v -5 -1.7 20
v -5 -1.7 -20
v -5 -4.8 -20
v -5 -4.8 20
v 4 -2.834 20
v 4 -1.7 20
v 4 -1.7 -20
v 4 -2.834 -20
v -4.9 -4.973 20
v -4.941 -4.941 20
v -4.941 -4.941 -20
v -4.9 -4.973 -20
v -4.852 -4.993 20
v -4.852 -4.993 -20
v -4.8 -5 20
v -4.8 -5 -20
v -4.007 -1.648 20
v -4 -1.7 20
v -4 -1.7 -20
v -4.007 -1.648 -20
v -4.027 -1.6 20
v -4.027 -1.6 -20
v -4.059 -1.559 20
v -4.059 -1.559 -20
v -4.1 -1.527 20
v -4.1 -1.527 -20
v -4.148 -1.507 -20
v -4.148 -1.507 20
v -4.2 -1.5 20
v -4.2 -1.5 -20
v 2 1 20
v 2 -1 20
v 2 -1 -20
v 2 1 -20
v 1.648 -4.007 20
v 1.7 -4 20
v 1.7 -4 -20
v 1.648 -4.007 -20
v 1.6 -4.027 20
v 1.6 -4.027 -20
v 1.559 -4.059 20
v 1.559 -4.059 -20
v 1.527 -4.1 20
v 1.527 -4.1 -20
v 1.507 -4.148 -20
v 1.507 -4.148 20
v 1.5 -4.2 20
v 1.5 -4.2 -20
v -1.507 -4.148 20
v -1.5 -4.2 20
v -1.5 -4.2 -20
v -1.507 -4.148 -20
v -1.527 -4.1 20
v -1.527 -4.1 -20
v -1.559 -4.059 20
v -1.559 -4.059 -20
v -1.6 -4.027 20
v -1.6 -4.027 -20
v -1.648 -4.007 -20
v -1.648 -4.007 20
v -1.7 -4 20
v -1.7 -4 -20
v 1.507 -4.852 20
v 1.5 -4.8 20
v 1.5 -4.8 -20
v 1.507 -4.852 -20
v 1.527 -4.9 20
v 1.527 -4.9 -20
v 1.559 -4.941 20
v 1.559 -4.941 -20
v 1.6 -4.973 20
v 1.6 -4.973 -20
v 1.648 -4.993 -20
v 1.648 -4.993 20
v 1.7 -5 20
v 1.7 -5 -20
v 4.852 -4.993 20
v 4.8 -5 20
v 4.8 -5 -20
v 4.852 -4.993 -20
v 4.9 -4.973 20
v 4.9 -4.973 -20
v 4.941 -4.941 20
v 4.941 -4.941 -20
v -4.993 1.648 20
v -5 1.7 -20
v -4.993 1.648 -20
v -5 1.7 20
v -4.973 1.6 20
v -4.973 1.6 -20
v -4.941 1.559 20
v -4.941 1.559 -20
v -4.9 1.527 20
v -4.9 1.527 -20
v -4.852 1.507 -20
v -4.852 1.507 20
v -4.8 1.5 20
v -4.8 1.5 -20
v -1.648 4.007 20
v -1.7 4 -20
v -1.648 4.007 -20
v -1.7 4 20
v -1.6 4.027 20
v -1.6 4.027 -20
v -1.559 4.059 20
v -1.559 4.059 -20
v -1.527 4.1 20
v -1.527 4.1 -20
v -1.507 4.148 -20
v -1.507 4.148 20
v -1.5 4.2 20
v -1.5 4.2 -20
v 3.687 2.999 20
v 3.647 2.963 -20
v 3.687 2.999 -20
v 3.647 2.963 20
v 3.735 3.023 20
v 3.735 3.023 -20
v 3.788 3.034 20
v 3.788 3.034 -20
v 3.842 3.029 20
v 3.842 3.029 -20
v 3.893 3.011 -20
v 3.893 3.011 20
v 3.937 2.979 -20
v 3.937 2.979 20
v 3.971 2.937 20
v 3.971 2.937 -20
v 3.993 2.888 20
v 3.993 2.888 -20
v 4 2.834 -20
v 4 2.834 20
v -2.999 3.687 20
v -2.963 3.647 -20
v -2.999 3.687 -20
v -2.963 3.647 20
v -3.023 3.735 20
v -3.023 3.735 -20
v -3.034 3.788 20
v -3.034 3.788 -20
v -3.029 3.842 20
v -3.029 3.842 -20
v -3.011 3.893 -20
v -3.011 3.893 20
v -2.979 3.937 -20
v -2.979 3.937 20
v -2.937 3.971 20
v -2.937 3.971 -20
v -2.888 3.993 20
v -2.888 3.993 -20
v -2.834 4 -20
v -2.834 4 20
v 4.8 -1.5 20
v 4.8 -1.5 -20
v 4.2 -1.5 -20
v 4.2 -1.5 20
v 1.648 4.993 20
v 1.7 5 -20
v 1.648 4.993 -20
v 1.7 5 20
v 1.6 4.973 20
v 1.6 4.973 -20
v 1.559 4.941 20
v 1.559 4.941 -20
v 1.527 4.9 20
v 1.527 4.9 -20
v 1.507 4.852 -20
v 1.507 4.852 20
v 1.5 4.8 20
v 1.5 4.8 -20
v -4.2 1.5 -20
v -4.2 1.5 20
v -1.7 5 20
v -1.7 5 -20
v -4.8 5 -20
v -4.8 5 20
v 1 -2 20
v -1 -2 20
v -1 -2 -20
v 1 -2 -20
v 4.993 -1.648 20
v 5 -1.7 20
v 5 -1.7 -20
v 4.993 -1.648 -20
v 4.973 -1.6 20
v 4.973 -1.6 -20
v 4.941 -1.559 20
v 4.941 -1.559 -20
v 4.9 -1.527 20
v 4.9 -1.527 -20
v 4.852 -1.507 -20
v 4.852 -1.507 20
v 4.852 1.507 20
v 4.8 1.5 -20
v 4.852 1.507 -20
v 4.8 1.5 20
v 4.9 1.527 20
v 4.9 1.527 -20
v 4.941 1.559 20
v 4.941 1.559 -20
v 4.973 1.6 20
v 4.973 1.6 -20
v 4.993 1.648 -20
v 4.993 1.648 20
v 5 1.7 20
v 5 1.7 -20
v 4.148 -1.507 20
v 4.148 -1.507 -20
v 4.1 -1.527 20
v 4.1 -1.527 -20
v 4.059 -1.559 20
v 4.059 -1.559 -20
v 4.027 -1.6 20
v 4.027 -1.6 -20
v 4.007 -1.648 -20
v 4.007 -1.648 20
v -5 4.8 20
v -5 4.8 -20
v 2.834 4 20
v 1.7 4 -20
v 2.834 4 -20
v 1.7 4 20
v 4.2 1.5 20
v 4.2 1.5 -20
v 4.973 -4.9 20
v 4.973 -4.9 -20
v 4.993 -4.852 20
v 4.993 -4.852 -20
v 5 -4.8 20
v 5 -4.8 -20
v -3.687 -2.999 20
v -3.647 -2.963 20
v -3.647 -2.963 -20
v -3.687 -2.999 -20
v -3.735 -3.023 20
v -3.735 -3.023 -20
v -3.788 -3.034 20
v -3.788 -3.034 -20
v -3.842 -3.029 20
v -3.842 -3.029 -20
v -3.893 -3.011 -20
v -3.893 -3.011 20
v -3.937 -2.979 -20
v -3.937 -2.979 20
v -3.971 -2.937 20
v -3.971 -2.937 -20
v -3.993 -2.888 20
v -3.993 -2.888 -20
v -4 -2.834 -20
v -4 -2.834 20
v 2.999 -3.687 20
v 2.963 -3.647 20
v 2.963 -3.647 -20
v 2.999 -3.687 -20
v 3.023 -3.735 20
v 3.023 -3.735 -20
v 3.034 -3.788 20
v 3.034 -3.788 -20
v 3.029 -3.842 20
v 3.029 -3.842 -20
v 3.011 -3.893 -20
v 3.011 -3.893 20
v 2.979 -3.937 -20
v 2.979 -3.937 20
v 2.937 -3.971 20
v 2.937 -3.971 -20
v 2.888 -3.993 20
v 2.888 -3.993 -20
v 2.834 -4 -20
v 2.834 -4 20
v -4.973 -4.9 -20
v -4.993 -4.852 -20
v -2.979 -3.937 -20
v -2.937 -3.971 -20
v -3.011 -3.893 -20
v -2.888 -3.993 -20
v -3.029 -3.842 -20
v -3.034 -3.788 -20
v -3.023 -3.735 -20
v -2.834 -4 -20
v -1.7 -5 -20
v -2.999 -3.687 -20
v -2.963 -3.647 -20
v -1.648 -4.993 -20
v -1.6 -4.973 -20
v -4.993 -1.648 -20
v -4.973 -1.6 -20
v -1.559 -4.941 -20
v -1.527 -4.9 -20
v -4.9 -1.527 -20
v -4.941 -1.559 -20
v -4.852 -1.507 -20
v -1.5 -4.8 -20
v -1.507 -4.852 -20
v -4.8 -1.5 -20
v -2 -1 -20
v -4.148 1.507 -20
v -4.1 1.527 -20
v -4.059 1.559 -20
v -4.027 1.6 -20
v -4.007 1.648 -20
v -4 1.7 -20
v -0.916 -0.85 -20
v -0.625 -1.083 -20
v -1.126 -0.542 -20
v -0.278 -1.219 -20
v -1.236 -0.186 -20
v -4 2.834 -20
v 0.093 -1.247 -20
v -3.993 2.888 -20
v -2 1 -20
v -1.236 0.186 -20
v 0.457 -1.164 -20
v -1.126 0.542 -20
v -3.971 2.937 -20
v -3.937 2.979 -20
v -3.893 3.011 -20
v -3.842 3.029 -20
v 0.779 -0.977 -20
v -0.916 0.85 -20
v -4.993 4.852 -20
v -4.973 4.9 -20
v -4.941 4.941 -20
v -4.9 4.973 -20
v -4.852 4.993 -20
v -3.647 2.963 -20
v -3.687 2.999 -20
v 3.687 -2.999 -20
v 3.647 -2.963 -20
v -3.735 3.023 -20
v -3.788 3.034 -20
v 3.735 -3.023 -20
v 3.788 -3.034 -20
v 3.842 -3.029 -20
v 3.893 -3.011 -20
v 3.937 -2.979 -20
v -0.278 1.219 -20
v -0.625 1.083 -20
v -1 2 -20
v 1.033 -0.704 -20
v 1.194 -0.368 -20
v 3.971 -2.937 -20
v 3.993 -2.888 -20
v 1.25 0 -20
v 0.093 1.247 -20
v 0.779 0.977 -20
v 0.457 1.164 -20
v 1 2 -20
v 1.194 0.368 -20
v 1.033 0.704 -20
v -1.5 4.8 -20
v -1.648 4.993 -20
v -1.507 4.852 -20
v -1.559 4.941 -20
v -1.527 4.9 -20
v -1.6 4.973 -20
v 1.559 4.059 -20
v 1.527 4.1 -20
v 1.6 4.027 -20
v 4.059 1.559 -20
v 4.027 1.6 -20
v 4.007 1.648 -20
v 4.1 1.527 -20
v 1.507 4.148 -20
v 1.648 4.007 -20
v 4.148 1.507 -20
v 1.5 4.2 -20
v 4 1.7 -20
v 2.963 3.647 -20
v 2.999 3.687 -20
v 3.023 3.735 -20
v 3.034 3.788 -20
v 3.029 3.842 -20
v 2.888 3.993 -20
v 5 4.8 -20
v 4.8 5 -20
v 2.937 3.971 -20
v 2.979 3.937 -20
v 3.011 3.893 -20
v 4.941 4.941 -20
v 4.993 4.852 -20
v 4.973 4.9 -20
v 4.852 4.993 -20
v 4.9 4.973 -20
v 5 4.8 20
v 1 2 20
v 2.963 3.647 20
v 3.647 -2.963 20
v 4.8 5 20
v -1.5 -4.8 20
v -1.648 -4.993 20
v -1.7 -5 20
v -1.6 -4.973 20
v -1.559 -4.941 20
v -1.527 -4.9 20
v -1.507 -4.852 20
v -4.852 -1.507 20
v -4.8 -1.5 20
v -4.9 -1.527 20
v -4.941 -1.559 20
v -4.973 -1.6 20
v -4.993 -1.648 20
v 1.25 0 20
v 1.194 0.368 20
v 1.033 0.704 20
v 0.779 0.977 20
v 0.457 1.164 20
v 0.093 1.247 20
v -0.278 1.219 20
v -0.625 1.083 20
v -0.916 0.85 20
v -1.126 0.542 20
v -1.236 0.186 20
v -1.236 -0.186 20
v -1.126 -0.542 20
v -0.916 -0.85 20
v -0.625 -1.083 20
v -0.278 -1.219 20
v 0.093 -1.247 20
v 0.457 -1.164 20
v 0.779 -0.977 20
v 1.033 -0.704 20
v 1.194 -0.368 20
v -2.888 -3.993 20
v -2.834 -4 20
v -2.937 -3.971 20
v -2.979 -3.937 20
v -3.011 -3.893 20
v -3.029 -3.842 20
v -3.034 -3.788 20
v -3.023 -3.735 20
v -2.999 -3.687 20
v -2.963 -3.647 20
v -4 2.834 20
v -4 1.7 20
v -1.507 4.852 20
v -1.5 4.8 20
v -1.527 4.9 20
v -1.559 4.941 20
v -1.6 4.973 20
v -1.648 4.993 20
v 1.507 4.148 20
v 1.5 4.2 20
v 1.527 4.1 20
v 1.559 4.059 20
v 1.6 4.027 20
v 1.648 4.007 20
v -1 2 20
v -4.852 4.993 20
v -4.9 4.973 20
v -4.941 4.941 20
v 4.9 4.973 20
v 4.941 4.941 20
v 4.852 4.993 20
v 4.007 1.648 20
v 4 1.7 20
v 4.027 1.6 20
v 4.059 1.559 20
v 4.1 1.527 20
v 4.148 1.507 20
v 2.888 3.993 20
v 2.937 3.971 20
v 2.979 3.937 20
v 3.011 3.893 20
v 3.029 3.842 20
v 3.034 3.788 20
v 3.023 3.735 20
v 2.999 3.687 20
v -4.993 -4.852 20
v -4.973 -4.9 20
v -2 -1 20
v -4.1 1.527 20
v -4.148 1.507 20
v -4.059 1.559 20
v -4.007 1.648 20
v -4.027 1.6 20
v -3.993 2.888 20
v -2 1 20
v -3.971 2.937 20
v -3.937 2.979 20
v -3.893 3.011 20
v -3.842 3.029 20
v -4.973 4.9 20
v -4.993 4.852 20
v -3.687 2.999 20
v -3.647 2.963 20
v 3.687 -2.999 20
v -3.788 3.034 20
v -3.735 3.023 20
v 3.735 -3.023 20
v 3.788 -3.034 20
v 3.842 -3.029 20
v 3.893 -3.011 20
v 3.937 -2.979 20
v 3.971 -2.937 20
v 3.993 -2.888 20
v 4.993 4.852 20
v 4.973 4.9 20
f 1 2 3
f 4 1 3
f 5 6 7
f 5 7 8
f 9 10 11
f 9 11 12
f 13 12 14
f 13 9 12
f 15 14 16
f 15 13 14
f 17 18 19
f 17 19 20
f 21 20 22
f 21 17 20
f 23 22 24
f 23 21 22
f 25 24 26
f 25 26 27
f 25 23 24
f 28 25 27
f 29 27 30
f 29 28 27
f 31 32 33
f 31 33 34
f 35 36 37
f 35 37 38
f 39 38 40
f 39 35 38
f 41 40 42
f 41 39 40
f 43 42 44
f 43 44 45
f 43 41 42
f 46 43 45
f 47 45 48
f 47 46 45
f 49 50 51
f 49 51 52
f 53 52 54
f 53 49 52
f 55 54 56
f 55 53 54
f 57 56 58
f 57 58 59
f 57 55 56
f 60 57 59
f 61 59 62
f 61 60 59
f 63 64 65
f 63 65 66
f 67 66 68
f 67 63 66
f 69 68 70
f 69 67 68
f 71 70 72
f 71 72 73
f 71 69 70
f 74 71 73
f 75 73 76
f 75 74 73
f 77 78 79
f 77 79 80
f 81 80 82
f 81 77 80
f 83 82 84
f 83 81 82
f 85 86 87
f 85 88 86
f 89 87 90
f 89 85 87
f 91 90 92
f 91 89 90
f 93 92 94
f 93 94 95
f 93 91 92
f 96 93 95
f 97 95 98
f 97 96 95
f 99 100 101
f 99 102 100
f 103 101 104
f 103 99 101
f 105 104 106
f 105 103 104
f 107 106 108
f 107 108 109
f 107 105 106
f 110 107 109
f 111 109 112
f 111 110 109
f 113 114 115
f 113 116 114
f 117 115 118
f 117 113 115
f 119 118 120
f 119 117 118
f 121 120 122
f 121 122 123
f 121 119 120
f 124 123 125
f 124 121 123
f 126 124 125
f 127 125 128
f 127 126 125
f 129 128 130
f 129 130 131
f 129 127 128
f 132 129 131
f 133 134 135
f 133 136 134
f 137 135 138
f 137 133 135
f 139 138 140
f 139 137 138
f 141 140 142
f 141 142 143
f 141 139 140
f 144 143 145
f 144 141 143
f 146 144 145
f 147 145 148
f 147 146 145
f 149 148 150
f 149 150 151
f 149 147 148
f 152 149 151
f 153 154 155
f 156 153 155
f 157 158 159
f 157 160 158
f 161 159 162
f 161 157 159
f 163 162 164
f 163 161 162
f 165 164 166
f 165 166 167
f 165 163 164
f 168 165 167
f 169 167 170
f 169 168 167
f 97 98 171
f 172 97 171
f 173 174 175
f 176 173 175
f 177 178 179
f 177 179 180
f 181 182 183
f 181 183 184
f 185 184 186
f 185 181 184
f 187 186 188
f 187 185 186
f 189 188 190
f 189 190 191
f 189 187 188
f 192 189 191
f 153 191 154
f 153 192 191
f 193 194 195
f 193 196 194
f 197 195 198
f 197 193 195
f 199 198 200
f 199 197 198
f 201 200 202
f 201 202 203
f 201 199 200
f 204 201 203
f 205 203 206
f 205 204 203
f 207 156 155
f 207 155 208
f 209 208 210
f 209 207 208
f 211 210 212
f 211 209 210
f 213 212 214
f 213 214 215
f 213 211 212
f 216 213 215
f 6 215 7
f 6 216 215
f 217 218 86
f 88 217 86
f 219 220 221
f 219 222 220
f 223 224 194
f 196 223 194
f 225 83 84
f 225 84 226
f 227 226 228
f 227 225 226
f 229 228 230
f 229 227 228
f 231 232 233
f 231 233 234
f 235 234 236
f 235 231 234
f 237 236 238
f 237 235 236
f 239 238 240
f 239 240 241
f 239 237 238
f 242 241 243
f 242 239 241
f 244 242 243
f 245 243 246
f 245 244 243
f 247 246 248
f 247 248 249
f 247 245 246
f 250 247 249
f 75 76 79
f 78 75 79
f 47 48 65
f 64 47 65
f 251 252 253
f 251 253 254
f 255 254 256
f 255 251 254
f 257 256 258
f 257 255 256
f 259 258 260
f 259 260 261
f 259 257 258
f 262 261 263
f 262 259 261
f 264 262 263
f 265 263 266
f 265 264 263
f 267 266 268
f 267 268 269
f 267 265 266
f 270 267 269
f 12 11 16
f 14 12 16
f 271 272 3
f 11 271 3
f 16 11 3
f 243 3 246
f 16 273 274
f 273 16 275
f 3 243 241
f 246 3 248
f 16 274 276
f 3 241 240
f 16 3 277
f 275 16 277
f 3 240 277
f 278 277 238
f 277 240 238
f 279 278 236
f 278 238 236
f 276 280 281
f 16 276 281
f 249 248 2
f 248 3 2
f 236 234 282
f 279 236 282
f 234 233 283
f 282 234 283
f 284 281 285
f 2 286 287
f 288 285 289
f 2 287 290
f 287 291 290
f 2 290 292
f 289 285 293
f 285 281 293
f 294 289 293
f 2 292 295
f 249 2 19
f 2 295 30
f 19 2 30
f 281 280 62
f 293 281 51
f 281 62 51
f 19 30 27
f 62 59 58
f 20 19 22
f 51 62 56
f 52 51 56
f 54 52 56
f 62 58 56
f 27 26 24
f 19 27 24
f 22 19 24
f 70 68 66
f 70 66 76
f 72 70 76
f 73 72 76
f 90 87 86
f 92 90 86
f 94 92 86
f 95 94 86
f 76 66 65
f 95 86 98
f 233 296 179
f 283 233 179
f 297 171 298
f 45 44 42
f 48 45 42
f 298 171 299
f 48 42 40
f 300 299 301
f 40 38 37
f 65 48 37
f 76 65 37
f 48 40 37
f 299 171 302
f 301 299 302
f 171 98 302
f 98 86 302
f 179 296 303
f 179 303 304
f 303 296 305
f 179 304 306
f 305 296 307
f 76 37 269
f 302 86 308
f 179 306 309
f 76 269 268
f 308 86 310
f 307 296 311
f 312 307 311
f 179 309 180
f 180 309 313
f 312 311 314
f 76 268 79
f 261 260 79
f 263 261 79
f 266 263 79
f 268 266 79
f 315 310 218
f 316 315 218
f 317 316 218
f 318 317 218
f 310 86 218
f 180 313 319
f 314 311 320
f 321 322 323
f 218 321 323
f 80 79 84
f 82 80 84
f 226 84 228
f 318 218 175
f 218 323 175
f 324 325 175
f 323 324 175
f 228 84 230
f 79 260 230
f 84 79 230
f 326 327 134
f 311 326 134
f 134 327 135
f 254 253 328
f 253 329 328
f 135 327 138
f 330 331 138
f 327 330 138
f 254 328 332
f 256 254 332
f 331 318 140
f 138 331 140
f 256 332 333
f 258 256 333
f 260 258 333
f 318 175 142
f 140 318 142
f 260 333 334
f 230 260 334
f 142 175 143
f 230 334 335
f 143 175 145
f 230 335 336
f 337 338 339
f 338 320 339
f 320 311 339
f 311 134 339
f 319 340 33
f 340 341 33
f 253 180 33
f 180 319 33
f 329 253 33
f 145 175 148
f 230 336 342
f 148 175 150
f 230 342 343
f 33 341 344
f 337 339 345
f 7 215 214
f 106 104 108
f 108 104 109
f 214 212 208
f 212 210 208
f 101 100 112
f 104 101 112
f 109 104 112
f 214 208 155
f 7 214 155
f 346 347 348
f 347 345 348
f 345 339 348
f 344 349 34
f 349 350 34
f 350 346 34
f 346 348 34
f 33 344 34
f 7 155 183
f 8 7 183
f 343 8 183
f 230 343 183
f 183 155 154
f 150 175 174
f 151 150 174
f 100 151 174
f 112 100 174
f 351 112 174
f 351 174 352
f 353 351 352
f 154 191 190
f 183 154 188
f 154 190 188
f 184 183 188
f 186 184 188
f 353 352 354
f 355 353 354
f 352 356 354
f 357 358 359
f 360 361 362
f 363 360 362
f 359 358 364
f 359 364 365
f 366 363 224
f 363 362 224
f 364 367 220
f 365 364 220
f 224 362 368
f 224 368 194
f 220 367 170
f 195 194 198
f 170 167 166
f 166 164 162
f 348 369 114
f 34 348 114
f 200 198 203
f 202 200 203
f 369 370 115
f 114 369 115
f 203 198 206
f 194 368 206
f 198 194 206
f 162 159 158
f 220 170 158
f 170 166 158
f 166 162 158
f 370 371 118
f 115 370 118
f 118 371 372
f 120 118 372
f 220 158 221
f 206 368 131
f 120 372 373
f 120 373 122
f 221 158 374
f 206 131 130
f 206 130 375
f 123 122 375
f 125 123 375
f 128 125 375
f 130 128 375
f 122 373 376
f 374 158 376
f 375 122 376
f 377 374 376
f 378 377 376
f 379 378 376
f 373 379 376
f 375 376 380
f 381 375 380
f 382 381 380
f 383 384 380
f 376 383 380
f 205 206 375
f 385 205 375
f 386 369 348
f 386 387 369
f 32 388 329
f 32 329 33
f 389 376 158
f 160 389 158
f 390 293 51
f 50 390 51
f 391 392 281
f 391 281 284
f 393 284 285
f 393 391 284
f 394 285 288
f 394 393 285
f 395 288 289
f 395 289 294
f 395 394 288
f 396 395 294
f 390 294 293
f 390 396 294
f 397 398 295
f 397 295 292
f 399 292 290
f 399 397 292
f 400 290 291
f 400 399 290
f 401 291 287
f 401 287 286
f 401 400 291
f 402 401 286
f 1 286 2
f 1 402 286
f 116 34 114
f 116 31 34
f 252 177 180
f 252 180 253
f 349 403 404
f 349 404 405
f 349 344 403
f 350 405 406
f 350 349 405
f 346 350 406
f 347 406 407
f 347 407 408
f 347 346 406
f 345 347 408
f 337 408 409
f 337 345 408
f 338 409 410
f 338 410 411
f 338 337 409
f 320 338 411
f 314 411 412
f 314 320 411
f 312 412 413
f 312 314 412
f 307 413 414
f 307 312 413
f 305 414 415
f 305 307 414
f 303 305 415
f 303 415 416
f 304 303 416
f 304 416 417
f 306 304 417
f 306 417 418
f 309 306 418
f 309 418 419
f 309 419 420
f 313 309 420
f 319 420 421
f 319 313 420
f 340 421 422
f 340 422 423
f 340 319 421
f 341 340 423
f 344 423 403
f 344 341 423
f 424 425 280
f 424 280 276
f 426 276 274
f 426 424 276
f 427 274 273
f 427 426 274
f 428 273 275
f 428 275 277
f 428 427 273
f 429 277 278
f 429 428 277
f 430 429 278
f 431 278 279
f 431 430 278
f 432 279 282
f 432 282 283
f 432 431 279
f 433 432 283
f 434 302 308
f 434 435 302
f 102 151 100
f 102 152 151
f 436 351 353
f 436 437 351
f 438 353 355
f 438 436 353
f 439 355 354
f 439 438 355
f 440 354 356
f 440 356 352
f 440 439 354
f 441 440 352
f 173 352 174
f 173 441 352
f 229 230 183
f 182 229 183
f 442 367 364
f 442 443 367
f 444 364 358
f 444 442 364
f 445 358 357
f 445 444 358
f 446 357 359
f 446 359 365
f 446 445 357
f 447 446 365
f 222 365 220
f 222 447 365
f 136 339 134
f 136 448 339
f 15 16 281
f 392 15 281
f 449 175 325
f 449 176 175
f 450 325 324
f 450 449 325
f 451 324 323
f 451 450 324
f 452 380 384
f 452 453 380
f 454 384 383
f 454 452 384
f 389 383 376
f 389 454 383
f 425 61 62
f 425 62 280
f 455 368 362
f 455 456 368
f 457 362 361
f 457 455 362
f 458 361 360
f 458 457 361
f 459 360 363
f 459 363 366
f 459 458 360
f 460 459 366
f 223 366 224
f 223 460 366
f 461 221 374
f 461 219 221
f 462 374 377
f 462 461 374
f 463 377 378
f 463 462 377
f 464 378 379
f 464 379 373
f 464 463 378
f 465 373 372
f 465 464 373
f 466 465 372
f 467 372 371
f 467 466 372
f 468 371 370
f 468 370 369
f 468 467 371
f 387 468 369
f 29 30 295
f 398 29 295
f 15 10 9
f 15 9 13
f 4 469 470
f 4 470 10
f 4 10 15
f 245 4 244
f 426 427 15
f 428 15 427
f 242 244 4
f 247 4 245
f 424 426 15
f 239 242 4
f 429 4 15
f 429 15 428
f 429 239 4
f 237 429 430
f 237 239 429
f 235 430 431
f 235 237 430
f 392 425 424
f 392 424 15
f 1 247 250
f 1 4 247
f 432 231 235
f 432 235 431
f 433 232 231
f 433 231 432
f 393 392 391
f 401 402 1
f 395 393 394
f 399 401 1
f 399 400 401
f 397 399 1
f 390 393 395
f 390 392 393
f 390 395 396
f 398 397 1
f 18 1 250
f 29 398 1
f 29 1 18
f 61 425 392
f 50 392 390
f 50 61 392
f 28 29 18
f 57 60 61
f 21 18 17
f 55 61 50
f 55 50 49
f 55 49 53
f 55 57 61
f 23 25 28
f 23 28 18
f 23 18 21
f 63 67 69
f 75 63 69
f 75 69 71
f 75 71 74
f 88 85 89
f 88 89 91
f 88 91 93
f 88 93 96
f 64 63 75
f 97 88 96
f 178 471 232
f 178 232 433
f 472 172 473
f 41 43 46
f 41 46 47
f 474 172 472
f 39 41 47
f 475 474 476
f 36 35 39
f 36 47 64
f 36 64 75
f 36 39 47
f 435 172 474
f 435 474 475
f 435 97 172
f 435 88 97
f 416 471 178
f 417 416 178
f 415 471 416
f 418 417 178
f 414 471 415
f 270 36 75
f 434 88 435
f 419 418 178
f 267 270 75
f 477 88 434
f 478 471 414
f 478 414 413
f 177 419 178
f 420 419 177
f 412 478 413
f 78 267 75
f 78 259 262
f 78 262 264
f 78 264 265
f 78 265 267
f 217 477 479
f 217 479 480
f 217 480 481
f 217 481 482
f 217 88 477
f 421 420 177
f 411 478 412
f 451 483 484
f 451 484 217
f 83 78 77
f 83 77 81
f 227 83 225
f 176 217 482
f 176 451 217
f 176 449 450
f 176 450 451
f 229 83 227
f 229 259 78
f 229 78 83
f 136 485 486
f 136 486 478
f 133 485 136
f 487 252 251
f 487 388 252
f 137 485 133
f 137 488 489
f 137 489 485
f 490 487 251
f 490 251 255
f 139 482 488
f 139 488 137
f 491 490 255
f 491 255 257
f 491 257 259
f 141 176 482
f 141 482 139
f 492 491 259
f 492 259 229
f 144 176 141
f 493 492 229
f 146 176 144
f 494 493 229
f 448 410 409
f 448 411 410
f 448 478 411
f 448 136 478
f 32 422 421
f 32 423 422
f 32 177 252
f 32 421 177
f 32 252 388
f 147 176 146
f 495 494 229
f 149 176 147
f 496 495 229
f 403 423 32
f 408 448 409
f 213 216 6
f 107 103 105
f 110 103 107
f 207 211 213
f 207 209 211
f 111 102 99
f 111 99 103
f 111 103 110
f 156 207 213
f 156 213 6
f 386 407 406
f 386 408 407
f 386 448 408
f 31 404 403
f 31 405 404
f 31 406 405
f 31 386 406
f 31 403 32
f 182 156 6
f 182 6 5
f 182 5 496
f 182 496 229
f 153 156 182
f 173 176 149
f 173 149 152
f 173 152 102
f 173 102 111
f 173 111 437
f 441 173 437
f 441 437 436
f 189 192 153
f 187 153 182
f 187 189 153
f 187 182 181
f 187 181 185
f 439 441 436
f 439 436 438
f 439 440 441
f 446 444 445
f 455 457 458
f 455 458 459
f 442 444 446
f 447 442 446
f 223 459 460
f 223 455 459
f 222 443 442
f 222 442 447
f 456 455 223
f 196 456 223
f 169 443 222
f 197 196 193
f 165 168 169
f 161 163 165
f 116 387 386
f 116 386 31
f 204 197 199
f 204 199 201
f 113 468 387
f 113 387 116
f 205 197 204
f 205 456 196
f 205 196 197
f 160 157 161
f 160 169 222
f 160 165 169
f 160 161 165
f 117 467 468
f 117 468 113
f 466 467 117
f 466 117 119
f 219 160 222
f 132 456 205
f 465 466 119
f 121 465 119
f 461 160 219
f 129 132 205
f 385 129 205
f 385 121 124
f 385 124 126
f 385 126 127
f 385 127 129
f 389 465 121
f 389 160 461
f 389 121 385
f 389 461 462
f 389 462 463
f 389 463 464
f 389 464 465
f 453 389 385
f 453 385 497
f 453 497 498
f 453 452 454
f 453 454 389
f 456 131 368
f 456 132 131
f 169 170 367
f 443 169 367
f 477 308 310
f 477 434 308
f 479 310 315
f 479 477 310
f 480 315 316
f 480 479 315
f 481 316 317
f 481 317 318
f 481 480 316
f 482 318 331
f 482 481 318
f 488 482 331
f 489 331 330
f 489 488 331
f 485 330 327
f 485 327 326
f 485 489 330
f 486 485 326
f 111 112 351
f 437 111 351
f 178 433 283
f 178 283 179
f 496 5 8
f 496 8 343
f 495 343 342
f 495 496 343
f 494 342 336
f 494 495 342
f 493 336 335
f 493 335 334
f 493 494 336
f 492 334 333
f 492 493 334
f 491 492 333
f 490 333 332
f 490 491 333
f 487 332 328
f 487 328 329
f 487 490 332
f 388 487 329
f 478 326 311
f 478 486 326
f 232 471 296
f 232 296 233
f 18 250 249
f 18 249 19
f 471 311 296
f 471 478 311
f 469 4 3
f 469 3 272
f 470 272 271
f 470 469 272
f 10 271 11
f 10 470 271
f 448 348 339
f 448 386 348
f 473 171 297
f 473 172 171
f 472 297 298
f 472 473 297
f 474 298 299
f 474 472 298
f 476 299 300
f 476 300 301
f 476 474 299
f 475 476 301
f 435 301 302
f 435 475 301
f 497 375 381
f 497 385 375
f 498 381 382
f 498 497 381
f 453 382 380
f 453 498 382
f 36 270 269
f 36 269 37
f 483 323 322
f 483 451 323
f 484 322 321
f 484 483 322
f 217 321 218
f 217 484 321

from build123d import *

# Parameters (mm, degrees)
F0_R     = 1.25
F1_DEPTH = 20


with BuildPart() as f1:
    # F0 (on Top) → F1 (new body, symmetric)
    with BuildSketch(Plane.XY):
        with BuildLine():
            Line((-2, 1), (-2, 0))
            Line((-2, 0), (-2, -1))
            Line((-2, -1), (-3.646791, -2.962569))
            ThreePointArc((-3.646791, -2.962569), (-3.868404, -3.02195), (-4, -2.834012))
            Line((-4, -2.834012), (-4, -1.7))
            ThreePointArc((-4, -1.7), (-4.058579, -1.558579), (-4.2, -1.5))
            Line((-4.2, -1.5), (-4.8, -1.5))
            ThreePointArc((-4.8, -1.5), (-4.941421, -1.558579), (-5, -1.7))
            Line((-5, -1.7), (-5, -4.8))
            ThreePointArc((-5, -4.8), (-4.984776, -4.876537), (-4.941421, -4.941421))
            ThreePointArc((-4.941421, -4.941421), (-4.876537, -4.984776), (-4.8, -5))
            Line((-4.8, -5), (-1.7, -5))
            ThreePointArc((-1.7, -5), (-1.558579, -4.941421), (-1.5, -4.8))
            Line((-1.5, -4.8), (-1.5, -4.2))
            ThreePointArc((-1.5, -4.2), (-1.558579, -4.058579), (-1.7, -4))
            Line((-1.7, -4), (-2.834012, -4))
            ThreePointArc((-2.834012, -4), (-3.02195, -3.868404), (-2.962569, -3.646791))
            Line((-2.962569, -3.646791), (-1, -2))
            Line((-1, -2), (0, -2))
            Line((0, -2), (1, -2))
            Line((1, -2), (2.962569, -3.646791))
            ThreePointArc((2.962569, -3.646791), (3.02195, -3.868404), (2.834012, -4))
            Line((2.834012, -4), (1.7, -4))
            ThreePointArc((1.7, -4), (1.558579, -4.058579), (1.5, -4.2))
            Line((1.5, -4.2), (1.5, -4.8))
            ThreePointArc((1.5, -4.8), (1.558579, -4.941421), (1.7, -5))
            Line((1.7, -5), (4.8, -5))
            ThreePointArc((4.8, -5), (4.876537, -4.984776), (4.941421, -4.941421))
            ThreePointArc((4.941421, -4.941421), (4.984776, -4.876537), (5, -4.8))
            Line((5, -4.8), (5, -1.7))
            ThreePointArc((5, -1.7), (4.941421, -1.558579), (4.8, -1.5))
            Line((4.8, -1.5), (4.2, -1.5))
            ThreePointArc((4.2, -1.5), (4.058579, -1.558579), (4, -1.7))
            Line((4, -1.7), (4, -2.834012))
            ThreePointArc((4, -2.834012), (3.868404, -3.02195), (3.646791, -2.962569))
            Line((3.646791, -2.962569), (2, -1))
            Line((2, -1), (2, 0))
            Line((2, 0), (2, 1))
            Line((2, 1), (3.646791, 2.962569))
            ThreePointArc((3.646791, 2.962569), (3.868404, 3.02195), (4, 2.834012))
            Line((4, 2.834012), (4, 1.7))
            ThreePointArc((4, 1.7), (4.058579, 1.558579), (4.2, 1.5))
            Line((4.2, 1.5), (4.8, 1.5))
            ThreePointArc((4.8, 1.5), (4.941421, 1.558579), (5, 1.7))
            Line((5, 1.7), (5, 4.8))
            ThreePointArc((5, 4.8), (4.984776, 4.876537), (4.941421, 4.941421))
            ThreePointArc((4.941421, 4.941421), (4.876537, 4.984776), (4.8, 5))
            Line((4.8, 5), (1.7, 5))
            ThreePointArc((1.7, 5), (1.558579, 4.941421), (1.5, 4.8))
            Line((1.5, 4.8), (1.5, 4.2))
            ThreePointArc((1.5, 4.2), (1.558579, 4.058579), (1.7, 4))
            Line((1.7, 4), (2.834012, 4))
            ThreePointArc((2.834012, 4), (3.02195, 3.868404), (2.962569, 3.646791))
            Line((2.962569, 3.646791), (1, 2))
            Line((1, 2), (0, 2))
            Line((0, 2), (-1, 2))
            Line((-1, 2), (-2.962569, 3.646791))
            ThreePointArc((-2.962569, 3.646791), (-3.02195, 3.868404), (-2.834012, 4))
            Line((-2.834012, 4), (-1.7, 4))
            ThreePointArc((-1.7, 4), (-1.558579, 4.058579), (-1.5, 4.2))
            Line((-1.5, 4.2), (-1.5, 4.8))
            ThreePointArc((-1.5, 4.8), (-1.558579, 4.941421), (-1.7, 5))
            Line((-1.7, 5), (-4.8, 5))
            ThreePointArc((-4.8, 5), (-4.876537, 4.984776), (-4.941421, 4.941421))
            ThreePointArc((-4.941421, 4.941421), (-4.984776, 4.876537), (-5, 4.8))
            Line((-5, 4.8), (-5, 1.7))
            ThreePointArc((-5, 1.7), (-4.941421, 1.558579), (-4.8, 1.5))
            Line((-4.8, 1.5), (-4.2, 1.5))
            ThreePointArc((-4.2, 1.5), (-4.058579, 1.558579), (-4, 1.7))
            Line((-4, 1.7), (-4, 2.834012))
            ThreePointArc((-4, 2.834012), (-3.868404, 3.02195), (-3.646791, 2.962569))
            Line((-3.646791, 2.962569), (-2, 1))
        make_face()
        Circle(F0_R, mode=Mode.SUBTRACT)
    extrude(amount=F1_DEPTH, both=True)


solid = f1.part
